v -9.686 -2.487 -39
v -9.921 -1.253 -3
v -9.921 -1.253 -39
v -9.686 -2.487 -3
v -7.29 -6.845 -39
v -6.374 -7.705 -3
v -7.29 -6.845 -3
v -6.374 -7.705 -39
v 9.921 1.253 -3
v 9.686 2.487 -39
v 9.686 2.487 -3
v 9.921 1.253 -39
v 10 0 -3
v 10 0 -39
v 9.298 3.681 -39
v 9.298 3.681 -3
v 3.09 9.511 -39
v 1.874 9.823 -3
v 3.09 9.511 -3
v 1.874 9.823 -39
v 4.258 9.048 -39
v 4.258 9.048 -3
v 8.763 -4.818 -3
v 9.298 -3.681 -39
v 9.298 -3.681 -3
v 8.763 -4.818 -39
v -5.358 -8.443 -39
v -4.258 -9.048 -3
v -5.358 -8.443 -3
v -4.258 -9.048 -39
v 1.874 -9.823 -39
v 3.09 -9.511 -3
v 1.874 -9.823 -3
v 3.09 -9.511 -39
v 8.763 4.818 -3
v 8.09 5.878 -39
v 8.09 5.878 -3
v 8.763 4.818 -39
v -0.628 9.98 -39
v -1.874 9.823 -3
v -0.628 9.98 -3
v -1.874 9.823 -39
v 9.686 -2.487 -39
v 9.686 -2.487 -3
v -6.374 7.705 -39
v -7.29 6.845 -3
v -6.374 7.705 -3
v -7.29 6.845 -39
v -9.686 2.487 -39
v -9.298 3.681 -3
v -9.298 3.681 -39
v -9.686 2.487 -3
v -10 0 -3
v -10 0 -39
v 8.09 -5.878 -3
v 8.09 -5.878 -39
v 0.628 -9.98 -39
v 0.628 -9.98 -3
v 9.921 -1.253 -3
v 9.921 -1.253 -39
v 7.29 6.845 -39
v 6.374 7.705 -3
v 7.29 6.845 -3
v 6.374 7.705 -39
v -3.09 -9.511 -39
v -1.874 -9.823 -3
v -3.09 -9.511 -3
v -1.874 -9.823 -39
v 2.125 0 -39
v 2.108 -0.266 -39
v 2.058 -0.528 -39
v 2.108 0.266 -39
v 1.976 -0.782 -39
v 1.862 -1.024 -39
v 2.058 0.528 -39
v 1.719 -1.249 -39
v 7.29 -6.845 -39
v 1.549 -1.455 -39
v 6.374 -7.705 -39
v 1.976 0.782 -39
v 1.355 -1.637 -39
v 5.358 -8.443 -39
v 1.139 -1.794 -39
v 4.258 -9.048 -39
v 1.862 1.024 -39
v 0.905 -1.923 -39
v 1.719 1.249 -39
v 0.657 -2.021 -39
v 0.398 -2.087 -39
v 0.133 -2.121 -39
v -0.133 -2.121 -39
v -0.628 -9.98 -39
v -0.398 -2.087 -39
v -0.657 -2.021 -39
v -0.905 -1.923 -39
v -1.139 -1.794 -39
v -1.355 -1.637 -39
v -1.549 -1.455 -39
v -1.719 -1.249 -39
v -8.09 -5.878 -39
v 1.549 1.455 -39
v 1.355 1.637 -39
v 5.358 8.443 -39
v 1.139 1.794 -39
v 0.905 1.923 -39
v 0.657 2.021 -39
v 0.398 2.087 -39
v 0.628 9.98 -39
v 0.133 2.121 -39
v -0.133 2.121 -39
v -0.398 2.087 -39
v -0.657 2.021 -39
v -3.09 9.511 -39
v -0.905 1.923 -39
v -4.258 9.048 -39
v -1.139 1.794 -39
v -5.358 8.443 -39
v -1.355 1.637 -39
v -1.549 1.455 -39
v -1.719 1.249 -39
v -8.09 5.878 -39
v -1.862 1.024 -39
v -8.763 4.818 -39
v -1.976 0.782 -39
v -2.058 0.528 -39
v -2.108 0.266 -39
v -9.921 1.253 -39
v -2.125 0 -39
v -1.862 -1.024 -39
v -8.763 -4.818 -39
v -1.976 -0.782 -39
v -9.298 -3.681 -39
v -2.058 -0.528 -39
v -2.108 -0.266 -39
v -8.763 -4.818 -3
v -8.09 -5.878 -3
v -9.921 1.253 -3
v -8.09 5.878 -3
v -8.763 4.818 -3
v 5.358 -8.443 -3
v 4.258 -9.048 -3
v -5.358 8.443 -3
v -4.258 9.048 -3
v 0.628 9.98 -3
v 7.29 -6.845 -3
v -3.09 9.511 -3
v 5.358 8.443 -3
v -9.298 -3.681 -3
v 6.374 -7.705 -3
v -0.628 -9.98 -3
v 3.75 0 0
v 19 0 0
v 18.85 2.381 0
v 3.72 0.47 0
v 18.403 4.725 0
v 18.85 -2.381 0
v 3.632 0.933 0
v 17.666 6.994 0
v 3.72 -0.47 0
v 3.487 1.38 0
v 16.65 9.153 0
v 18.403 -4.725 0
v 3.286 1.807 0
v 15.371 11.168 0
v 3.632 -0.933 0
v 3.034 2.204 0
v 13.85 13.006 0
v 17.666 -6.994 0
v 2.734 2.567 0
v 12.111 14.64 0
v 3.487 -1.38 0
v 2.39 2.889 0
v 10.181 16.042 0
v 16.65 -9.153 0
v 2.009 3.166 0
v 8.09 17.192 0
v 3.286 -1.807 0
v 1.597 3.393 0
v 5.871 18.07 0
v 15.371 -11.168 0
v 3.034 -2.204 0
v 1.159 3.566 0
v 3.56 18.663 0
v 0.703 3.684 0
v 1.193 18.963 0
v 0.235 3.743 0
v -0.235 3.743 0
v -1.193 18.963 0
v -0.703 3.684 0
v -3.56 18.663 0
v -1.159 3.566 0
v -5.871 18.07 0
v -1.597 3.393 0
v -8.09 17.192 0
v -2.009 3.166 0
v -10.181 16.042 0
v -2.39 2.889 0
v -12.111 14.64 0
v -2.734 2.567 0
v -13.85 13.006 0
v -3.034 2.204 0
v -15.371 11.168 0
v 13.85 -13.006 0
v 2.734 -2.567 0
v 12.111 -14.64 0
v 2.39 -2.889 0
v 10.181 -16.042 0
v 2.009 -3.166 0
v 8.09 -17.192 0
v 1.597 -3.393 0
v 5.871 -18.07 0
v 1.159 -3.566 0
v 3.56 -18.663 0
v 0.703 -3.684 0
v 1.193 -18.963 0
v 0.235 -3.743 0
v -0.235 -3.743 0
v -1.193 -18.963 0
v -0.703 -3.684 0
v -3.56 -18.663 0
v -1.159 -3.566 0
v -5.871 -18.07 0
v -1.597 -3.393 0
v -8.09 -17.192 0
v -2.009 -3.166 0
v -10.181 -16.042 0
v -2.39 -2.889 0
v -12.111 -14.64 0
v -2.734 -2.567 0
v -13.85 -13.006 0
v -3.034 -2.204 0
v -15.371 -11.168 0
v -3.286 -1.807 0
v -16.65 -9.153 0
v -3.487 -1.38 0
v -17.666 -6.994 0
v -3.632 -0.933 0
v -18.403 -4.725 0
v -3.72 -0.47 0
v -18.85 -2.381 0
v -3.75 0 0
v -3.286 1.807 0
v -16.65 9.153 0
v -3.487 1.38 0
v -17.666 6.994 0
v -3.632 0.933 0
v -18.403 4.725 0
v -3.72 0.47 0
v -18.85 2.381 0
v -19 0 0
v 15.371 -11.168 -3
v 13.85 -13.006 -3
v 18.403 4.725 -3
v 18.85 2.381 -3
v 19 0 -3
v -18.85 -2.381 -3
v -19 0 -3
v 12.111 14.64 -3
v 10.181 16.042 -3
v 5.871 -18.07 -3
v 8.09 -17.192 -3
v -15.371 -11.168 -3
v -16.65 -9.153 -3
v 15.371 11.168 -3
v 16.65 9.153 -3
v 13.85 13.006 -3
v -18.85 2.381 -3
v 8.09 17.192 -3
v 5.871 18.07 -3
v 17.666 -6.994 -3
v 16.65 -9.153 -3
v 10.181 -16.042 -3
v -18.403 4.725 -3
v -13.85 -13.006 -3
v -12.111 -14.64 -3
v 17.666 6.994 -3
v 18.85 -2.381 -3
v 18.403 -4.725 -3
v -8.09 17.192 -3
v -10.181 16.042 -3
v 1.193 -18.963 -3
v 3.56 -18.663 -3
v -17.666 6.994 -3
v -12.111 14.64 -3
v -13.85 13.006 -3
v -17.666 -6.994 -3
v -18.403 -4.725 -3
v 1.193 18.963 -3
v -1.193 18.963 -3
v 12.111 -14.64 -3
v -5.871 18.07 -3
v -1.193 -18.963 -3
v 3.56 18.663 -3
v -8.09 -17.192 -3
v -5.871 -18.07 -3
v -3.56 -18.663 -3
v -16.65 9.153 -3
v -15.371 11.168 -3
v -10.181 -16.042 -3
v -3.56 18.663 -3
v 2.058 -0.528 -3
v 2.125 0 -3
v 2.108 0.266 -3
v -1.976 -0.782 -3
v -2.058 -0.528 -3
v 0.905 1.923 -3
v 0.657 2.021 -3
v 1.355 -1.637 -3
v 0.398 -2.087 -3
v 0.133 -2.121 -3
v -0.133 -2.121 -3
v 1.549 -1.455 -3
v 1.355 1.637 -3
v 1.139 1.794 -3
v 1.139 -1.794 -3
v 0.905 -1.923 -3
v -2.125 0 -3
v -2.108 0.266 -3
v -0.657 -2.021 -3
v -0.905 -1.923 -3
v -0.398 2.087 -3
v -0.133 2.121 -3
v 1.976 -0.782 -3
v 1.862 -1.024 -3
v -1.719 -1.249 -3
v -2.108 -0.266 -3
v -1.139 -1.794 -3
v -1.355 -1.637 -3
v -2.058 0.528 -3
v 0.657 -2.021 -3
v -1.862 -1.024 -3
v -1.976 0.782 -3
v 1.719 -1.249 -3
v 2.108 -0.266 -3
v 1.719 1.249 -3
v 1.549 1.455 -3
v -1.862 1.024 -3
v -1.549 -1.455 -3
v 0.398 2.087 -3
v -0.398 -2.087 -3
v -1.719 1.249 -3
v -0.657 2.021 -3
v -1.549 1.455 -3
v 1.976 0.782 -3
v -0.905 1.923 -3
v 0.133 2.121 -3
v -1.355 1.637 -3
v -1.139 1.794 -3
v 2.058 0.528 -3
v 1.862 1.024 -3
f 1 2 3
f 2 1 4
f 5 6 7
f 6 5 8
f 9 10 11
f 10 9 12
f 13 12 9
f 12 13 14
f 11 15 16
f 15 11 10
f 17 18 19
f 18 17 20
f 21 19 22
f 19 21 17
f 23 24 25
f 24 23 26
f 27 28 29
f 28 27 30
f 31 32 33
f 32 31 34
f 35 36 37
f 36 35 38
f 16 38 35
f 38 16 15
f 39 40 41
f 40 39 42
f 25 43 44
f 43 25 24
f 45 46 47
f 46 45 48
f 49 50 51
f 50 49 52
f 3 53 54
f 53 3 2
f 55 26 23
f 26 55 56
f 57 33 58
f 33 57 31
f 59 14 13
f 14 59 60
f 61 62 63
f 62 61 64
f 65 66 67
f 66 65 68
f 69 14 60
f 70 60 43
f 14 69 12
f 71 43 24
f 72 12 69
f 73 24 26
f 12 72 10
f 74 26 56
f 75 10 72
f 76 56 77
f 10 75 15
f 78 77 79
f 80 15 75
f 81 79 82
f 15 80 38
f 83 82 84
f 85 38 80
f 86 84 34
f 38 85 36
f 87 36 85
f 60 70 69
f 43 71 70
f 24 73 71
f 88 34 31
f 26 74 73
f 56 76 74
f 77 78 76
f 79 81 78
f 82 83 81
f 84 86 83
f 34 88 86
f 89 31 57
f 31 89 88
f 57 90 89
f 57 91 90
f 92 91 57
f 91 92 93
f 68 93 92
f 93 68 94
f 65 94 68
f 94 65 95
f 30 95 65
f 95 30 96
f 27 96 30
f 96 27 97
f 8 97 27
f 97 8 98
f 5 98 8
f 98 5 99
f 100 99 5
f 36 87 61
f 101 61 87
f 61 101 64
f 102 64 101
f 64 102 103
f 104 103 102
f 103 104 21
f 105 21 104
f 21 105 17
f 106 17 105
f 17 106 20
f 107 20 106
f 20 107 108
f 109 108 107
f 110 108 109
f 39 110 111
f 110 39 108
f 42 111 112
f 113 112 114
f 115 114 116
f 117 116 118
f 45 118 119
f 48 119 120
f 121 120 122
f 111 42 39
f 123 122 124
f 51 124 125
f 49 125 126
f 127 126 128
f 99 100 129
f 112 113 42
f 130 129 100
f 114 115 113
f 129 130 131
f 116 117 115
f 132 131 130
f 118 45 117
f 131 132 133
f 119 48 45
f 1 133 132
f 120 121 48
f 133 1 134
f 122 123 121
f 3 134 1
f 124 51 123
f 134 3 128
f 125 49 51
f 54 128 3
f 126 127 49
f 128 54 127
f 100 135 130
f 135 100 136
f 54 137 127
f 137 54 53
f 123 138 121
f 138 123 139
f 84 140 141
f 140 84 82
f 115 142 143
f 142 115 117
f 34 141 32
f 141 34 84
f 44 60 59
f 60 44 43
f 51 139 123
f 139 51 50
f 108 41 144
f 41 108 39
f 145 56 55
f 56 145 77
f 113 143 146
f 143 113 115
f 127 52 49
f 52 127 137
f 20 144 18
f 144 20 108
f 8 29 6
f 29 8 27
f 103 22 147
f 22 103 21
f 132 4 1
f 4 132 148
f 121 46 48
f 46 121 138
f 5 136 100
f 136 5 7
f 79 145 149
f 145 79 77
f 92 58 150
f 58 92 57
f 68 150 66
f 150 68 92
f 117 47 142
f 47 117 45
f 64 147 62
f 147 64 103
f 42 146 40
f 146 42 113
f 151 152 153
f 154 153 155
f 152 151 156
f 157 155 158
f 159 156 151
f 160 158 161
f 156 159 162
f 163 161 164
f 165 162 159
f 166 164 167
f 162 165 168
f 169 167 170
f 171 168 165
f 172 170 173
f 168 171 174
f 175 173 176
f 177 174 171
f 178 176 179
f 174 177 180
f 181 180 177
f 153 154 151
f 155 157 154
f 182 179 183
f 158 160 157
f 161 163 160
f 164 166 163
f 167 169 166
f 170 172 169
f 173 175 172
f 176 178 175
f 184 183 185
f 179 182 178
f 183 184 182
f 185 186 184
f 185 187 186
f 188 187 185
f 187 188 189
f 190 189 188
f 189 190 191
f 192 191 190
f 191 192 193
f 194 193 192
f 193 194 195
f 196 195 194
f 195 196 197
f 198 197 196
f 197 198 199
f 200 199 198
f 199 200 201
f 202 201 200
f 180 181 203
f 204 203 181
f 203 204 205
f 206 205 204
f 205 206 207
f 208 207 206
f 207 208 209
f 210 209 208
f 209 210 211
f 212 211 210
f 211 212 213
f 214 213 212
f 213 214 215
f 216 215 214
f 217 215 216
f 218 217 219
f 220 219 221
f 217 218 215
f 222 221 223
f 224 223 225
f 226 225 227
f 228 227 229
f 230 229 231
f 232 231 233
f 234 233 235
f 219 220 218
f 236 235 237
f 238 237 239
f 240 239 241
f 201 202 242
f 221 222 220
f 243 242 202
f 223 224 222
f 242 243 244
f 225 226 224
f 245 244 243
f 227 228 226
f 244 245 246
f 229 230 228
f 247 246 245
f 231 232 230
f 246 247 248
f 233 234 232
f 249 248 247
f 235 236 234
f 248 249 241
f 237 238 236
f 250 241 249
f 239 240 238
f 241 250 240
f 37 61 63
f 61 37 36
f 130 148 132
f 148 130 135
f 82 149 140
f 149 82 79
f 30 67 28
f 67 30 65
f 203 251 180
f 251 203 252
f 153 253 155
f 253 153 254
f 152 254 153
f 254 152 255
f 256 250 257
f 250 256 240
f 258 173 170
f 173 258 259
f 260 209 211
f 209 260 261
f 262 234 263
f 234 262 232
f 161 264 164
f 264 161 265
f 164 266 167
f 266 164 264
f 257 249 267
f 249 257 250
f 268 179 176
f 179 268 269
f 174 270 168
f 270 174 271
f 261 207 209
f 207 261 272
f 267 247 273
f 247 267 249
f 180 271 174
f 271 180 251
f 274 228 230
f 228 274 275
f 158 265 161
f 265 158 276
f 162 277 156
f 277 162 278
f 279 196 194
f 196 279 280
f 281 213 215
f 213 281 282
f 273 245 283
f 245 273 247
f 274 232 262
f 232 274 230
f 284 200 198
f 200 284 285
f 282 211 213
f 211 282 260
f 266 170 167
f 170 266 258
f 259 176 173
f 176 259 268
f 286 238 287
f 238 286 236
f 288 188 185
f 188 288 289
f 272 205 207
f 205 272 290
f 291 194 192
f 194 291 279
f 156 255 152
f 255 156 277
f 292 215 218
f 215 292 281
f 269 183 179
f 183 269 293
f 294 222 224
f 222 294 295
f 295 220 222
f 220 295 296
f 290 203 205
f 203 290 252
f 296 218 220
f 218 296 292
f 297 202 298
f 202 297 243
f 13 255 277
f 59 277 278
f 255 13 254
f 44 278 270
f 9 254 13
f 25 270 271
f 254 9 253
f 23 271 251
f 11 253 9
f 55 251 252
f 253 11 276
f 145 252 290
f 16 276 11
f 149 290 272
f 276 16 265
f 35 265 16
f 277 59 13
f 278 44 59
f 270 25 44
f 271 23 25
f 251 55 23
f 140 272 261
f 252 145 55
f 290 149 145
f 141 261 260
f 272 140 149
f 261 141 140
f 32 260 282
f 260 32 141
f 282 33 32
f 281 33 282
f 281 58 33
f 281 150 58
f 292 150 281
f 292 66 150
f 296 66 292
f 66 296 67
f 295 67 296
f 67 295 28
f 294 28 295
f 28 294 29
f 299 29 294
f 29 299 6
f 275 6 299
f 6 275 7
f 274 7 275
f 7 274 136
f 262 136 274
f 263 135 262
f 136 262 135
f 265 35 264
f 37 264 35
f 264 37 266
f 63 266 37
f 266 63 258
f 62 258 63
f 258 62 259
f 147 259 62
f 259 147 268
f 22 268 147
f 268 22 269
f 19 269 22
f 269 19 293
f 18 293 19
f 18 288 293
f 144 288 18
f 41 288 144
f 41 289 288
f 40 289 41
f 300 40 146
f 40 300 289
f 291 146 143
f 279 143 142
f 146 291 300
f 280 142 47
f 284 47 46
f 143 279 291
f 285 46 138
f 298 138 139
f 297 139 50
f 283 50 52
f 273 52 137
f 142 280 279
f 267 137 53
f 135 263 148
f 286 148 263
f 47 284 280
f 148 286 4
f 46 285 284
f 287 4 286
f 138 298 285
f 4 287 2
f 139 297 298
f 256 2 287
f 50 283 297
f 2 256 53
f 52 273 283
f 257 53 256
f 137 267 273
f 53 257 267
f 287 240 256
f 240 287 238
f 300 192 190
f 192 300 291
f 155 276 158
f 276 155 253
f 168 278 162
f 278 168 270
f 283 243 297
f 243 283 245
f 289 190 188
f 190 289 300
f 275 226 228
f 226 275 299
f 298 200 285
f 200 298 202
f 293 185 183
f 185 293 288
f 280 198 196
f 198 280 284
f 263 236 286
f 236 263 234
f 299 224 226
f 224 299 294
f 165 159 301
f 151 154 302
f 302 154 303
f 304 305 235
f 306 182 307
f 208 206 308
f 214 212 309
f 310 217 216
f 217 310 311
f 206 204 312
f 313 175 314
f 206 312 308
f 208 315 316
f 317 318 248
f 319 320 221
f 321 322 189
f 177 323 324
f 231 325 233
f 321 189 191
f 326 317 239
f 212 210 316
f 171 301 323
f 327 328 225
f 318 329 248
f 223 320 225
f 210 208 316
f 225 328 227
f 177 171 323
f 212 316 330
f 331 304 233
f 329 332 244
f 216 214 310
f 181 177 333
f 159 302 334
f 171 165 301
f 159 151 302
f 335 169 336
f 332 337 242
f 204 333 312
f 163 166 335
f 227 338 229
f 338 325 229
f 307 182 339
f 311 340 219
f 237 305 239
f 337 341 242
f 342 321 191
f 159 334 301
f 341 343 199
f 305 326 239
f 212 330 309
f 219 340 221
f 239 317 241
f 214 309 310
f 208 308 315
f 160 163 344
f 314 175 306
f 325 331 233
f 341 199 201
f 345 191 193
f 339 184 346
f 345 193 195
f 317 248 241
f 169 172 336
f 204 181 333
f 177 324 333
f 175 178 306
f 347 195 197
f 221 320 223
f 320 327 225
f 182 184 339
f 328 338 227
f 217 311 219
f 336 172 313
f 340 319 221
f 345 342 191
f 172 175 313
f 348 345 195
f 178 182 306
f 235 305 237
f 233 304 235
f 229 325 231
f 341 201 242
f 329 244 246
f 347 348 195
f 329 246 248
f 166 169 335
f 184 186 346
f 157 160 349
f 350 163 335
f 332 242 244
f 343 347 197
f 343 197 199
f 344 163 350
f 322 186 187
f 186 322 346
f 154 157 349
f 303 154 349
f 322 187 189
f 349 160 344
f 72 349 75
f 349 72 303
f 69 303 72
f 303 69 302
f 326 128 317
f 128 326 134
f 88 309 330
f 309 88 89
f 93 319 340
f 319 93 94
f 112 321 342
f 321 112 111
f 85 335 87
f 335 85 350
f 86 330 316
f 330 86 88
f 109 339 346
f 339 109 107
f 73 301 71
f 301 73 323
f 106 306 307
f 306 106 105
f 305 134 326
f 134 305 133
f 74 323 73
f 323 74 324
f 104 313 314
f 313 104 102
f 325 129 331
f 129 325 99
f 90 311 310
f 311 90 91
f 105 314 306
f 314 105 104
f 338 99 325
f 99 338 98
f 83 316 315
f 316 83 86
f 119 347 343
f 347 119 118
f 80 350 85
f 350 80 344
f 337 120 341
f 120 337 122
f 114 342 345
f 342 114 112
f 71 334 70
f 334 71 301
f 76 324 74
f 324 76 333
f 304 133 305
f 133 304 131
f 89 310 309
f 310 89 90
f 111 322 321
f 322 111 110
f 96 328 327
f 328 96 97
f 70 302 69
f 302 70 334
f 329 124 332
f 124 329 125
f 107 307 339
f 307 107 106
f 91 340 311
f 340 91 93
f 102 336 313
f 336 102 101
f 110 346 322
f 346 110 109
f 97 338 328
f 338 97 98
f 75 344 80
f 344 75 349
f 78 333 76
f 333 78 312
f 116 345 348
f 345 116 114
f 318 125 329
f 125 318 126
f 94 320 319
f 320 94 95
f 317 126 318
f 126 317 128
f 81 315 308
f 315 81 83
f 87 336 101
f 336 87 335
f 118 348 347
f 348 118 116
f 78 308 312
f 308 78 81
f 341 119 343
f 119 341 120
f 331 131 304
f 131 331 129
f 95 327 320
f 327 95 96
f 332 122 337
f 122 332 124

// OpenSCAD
$fn = 50;


difference() {
	union() {
		translate(v = [0, 0, -39.0000000000]) {
			cylinder(h = 39, r = 10.0000000000);
		}
		translate(v = [0, 0, -3.0000000000]) {
			cylinder(h = 3, r = 19.0000000000);
		}
	}
	union() {
		translate(v = [0, 0, 0]) {
			rotate(a = [0, 0, 0]) {
				difference() {
					union() {
						#translate(v = [0, 0, -39.0000000000]) {
							cylinder(h = 39, r = 2.0000000000);
						}
						#translate(v = [0, 0, -3]) {
							cylinder(h = 3, r = 10.0000000000, r1 = 2.1250000000, r2 = 3.7500000000);
						}
						#translate(v = [0, 0, -39.0000000000]) {
							cylinder(h = 39, r = 2.1250000000);
						}
						#translate(v = [0, 0, -39.0000000000]) {
							cylinder(h = 39, r = 2.0000000000);
						}
					}
					union();
				}
			}
		}
	}
}
